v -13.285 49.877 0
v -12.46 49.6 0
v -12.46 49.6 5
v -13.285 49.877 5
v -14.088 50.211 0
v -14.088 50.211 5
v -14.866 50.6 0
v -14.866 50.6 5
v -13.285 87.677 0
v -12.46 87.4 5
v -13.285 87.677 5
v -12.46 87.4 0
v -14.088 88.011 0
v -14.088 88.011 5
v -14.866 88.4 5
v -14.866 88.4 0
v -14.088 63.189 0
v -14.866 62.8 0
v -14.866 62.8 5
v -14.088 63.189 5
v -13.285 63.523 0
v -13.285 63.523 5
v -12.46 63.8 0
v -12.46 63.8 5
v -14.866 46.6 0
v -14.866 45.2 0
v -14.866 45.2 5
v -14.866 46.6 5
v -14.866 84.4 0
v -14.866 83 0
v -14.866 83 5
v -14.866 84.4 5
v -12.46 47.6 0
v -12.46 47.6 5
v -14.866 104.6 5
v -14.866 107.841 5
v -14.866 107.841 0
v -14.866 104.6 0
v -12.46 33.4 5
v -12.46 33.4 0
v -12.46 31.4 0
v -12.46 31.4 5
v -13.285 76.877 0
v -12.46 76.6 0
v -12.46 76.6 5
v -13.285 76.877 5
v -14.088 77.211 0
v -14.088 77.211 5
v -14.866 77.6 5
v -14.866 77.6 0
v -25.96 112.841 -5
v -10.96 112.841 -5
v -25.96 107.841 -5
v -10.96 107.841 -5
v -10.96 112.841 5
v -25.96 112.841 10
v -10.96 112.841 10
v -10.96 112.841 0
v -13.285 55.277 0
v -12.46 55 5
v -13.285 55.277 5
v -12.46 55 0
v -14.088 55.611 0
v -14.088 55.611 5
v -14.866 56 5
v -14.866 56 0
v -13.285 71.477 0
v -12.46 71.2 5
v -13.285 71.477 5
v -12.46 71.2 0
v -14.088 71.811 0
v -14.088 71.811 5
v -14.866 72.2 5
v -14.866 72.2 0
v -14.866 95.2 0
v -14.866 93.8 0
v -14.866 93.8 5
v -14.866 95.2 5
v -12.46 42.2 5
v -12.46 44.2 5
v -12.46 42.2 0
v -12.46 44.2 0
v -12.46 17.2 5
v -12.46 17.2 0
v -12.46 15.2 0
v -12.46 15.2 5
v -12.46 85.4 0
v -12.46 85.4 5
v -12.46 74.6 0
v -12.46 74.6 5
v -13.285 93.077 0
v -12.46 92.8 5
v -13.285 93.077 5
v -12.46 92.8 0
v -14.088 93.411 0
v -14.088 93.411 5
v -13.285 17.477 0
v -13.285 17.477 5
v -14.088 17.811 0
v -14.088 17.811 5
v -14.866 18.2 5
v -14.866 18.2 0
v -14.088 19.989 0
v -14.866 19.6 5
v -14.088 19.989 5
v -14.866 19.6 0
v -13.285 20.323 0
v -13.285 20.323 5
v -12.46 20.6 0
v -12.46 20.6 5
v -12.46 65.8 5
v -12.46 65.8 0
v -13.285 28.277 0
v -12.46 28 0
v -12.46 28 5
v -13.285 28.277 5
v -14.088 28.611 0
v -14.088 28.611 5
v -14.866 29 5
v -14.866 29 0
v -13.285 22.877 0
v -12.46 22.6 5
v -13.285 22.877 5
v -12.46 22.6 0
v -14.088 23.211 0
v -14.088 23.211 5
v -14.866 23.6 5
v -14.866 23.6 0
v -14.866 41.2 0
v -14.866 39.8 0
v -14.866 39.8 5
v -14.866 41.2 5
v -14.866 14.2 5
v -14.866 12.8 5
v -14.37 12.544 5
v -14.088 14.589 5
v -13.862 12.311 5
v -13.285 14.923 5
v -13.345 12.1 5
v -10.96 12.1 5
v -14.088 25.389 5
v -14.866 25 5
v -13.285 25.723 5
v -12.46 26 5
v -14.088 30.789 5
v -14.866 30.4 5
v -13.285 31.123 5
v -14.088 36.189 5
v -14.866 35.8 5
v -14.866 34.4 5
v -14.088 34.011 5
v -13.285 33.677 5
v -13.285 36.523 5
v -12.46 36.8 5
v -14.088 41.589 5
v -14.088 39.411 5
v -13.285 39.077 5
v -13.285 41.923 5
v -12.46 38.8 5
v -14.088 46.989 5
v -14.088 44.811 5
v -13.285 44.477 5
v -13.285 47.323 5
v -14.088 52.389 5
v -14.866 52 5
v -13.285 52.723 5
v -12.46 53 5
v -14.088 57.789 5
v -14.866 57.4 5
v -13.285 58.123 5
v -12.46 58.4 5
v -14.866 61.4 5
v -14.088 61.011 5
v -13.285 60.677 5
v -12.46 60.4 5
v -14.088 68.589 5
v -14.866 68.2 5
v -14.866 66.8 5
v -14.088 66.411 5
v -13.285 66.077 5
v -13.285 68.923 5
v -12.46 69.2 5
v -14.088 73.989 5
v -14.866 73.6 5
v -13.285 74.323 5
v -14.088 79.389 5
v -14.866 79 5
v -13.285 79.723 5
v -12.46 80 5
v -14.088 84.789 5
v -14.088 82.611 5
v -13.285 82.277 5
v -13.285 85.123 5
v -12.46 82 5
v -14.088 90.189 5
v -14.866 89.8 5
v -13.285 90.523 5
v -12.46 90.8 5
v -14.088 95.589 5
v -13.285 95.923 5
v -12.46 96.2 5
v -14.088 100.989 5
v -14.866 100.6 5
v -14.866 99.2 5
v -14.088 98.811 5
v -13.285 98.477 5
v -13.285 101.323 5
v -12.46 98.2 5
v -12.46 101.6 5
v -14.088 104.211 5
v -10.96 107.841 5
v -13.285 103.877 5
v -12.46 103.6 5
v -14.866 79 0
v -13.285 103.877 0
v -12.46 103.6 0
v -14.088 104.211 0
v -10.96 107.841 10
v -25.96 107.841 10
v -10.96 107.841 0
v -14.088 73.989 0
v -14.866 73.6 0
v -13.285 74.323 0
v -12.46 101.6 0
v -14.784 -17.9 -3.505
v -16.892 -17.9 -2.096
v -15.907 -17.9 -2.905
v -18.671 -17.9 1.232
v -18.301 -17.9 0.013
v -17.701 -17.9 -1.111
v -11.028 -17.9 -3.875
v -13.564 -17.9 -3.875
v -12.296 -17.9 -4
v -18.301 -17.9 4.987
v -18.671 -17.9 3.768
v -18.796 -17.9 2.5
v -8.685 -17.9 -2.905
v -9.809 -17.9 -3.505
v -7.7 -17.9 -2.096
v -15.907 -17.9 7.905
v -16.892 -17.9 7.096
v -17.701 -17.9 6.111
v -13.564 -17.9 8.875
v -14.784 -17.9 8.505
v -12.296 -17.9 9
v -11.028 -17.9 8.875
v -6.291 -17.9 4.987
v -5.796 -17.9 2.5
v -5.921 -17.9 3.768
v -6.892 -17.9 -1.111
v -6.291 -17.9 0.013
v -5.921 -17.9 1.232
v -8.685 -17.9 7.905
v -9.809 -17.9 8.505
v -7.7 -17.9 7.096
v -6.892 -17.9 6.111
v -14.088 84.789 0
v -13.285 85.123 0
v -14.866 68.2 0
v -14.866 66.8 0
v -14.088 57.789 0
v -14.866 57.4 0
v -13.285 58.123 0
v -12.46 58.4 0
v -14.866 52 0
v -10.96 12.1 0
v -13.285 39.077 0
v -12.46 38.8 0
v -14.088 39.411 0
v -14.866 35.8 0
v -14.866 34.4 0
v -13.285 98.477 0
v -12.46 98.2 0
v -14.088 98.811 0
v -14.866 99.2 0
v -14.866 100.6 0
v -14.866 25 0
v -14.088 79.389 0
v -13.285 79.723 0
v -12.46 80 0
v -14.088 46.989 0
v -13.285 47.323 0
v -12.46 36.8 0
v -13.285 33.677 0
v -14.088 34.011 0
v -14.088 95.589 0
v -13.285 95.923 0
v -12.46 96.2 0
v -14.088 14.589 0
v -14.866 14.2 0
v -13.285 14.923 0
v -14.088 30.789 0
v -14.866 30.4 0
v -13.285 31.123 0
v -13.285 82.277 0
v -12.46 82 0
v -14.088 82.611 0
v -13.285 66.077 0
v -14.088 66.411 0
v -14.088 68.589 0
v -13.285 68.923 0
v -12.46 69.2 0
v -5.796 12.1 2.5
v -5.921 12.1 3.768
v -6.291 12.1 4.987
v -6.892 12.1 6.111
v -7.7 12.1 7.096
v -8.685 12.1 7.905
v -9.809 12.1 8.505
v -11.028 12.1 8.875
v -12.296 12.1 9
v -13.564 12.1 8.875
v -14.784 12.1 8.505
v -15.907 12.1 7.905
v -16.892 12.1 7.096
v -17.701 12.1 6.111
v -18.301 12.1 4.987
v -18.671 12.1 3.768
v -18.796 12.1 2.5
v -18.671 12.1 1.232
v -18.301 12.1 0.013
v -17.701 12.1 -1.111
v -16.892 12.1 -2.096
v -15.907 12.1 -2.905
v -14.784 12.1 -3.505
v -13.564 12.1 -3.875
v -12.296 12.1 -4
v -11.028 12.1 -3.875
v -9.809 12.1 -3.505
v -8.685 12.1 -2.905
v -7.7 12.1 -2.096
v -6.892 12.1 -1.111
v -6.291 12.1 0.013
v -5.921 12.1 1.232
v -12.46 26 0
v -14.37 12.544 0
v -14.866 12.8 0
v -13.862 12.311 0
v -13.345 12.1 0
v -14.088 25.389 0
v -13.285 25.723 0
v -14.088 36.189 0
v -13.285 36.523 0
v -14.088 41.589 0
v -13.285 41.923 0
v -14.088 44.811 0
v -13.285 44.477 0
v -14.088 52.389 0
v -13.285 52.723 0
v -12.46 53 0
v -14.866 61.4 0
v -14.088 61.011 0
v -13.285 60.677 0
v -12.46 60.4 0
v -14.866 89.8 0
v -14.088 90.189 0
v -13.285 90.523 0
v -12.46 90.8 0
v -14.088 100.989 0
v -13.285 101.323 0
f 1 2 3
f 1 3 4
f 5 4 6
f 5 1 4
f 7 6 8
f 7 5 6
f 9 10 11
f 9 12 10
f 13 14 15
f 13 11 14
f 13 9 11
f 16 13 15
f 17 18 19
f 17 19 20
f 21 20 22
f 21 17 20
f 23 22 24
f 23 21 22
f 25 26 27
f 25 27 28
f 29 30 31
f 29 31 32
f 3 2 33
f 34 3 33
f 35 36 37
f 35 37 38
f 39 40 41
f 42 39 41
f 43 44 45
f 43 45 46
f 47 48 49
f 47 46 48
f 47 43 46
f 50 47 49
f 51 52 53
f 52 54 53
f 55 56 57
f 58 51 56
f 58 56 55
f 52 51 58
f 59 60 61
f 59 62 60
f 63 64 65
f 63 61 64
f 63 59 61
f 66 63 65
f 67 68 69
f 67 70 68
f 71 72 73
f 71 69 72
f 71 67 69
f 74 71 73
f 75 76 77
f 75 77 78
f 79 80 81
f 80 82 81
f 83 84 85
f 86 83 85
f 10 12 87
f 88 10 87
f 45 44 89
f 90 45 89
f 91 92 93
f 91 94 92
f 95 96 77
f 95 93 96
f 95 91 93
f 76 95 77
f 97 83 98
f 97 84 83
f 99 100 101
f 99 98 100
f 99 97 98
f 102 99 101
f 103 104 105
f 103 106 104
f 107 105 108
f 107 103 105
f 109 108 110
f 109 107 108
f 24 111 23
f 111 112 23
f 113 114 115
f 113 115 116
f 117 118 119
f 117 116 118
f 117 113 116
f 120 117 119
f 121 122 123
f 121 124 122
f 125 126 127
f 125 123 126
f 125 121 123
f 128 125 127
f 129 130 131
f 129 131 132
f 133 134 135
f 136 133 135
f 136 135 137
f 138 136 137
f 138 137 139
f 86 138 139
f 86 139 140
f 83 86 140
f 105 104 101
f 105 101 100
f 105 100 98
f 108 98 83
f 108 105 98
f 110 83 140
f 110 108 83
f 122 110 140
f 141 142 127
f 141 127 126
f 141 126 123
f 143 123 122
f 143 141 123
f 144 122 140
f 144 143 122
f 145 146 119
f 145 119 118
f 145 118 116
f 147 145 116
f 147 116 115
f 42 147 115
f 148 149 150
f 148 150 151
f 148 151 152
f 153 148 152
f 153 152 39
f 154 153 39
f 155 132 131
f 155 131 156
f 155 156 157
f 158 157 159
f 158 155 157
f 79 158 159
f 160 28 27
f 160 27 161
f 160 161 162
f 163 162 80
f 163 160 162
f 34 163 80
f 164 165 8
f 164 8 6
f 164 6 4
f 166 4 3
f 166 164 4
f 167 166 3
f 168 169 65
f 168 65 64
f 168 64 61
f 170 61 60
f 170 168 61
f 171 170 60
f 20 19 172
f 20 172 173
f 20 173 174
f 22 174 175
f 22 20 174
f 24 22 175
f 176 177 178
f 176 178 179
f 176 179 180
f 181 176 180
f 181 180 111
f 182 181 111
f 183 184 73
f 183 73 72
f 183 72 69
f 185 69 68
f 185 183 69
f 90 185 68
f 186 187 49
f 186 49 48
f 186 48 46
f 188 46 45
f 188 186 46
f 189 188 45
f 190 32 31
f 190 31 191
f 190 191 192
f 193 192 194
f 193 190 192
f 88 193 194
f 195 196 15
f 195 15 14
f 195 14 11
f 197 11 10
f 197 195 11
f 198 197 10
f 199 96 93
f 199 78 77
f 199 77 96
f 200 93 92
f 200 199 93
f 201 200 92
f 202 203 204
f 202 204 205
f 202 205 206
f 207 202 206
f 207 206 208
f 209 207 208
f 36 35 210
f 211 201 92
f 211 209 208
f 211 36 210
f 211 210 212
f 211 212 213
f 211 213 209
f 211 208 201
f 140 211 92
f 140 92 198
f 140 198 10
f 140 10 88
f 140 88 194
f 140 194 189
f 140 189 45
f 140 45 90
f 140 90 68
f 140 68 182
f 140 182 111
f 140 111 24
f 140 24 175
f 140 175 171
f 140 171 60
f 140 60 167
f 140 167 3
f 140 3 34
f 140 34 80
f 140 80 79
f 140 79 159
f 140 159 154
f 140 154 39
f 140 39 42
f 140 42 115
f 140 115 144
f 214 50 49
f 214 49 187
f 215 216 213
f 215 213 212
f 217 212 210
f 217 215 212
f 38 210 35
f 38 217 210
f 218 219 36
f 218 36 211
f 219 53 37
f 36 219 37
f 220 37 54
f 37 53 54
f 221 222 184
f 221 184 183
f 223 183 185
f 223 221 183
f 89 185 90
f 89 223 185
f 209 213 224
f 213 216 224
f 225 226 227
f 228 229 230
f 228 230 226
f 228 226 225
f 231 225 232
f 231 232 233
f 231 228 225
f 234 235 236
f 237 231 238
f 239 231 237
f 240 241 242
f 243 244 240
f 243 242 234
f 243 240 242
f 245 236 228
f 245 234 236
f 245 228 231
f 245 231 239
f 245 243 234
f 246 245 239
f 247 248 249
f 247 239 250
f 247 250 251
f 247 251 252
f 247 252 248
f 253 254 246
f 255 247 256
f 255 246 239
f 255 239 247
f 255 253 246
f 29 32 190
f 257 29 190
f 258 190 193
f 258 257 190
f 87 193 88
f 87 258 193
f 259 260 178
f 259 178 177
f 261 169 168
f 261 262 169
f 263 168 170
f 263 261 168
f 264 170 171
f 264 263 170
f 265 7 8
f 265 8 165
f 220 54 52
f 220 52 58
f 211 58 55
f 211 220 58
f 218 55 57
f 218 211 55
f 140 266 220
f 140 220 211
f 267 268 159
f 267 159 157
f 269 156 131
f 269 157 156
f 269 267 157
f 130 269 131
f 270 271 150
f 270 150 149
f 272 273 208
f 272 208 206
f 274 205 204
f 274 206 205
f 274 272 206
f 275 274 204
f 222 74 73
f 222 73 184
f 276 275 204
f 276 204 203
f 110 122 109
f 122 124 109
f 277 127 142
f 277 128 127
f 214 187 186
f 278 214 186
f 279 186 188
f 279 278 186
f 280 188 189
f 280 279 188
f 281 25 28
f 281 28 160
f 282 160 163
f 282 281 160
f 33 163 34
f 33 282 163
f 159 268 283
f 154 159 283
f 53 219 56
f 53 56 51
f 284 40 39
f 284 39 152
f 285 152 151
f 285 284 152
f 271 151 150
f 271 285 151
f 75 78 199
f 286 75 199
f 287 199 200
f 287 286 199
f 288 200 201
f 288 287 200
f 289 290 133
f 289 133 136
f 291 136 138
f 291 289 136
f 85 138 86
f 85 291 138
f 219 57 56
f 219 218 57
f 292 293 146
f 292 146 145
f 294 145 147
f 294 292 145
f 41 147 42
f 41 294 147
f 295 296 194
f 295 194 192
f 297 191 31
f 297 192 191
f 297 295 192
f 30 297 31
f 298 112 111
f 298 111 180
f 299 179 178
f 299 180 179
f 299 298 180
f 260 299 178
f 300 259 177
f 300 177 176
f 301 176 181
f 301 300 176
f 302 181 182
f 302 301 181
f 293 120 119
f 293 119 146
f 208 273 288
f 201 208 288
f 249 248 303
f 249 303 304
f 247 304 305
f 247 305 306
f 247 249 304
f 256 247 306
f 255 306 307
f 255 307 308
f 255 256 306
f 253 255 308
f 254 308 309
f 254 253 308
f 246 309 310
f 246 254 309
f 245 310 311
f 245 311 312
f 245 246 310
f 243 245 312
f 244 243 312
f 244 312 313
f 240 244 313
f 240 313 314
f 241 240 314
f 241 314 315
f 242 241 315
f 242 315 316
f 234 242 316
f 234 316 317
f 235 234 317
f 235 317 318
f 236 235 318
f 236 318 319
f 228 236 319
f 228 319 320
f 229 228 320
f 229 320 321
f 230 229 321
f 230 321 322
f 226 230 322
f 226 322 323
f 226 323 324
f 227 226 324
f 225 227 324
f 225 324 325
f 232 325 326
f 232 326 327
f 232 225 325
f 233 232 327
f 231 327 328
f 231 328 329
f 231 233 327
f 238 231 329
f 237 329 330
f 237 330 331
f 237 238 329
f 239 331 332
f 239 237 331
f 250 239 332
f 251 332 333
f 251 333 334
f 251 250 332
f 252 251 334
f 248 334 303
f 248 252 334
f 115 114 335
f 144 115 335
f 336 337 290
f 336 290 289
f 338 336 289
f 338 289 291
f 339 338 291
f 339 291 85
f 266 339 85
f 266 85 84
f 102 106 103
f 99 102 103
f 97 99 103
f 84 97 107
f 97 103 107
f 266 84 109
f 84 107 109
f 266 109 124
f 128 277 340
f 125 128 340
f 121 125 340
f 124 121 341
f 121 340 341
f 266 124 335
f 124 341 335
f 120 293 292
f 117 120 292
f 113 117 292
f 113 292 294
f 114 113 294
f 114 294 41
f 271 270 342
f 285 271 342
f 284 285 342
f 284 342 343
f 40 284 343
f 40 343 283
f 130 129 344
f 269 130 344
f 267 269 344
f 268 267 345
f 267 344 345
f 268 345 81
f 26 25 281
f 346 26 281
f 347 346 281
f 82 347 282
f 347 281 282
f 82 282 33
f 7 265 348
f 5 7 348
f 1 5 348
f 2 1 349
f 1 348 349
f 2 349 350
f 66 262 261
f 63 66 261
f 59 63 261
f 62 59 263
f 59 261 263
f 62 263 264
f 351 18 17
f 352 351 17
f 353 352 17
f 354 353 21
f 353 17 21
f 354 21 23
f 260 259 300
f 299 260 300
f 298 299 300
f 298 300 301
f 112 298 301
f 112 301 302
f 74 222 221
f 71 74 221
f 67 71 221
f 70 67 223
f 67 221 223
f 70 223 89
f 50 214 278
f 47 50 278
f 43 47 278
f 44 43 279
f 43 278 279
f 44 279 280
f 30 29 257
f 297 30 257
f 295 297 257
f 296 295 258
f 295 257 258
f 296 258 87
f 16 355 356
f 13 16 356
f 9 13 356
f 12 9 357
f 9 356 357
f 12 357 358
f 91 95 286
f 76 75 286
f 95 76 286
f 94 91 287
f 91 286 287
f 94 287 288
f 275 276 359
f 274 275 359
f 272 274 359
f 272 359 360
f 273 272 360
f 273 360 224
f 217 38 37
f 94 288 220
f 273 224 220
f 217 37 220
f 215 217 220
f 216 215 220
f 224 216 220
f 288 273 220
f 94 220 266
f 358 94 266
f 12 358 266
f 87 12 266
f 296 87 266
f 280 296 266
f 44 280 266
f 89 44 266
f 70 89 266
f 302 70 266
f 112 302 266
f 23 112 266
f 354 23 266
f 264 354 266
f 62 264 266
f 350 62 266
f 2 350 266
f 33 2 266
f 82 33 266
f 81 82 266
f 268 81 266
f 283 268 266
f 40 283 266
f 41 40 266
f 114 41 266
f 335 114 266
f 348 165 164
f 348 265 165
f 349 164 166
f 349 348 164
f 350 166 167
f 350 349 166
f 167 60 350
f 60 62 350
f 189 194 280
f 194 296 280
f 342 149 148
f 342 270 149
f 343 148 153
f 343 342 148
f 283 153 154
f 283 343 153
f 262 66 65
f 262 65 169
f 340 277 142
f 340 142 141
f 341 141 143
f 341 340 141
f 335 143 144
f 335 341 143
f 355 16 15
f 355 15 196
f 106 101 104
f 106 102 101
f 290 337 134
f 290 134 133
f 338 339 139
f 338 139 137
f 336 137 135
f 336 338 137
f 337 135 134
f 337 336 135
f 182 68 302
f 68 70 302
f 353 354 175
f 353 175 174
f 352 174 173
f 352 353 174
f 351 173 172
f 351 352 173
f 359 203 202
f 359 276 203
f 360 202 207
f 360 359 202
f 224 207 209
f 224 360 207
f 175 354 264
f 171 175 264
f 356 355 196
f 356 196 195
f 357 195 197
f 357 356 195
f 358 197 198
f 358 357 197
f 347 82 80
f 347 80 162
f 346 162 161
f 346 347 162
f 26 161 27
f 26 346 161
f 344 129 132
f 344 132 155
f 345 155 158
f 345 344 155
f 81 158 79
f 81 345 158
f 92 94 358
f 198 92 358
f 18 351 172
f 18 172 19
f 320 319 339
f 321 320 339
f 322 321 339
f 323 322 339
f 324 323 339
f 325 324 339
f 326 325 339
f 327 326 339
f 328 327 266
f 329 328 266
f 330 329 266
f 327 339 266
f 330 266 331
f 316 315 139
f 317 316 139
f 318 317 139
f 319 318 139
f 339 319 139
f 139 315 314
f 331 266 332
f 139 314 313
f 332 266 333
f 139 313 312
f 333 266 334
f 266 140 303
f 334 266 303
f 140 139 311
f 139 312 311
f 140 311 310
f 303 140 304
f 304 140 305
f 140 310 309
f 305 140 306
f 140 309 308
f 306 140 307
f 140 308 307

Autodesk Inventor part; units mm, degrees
ref_plane "YZ Plane" through (0, 0, 0) normal (1, 0, 0) x (0, 1, 0)
ref_plane "XZ Plane" through (0, 0, 0) normal (0, 1, 0) x (-1, 0, 0)
ref_plane "XY Plane" through (0, 0, 0) normal (0, 0, 1) x (1, 0, 0)
sketch "Skizze2" plane through (0, 0, 0) normal (0, 0, 1) x (1, 0, 0)
  circle A0 centre (0, 0) radius 12.5 construction
  circle A1 centre (0, 0) radius 15
  line L0 (-15, 0) -> (-12.5, 0)
  arc A2 (-12.4599, -1) -> (-14.8661, -2) centre (-8.8919, -12.9799) ccw
  arc A3 (-14.8661, 2) -> (-12.4599, 1) centre (-8.8919, 12.9799) ccw
  arc A4 (-14.8661, 2) -> (-14.8661, -2) centre (0, 0) ccw
  arc A5 (-12.4599, 1) -> (-12.4599, -1) centre (0, 0) ccw
  circle A6 centre (0, 0) radius 15
  line L1 (-12.4599, 1) -> (-12.4599, -1)
  line L2 (-12.4599, 1) -> (-12.4599, 21)
  line L3 (-12.4599, -1) -> (-12.4599, -21)
  line L4 (-14.8661, -2) -> (-14.8661, -21)
  line L5 (-12.4599, -21) -> (-14.8661, -21)
  line L6 (-14.8661, 2) -> (-14.8661, 21)
  line L7 (-14.8661, 21) -> (-12.4599, 21)
  line L8 (-12.4599, 21) -> (-10.9599, 21)
  line L9 (-10.9599, 21) -> (-10.9599, -21)
  line L10 (-10.9599, -21) -> (-12.4599, -21)
  line L11 (-14.8661, 2) -> (-14.8661, 2.9)
  line L12 (-14.8661, 2.9) -> (-12.4599, 2.9)
  line L13 (-14.8661, -2) -> (-14.8661, -2.9)
  line L14 (-14.8661, -2.9) -> (-12.4599, -2.9)
  point P0 (-13.75, 0)
  point P1 (-15, 0)
  point P2 (-12.4599, -8.3516)
  point P3 (-10.9599, -10.2411)
  point P4 (-10.9599, 10.2411)
  point P5 (-12.4599, 8.3516)
  dimension "d5" = 25
  dimension "d6" = 12.5
  dimension "d7" = 4
  dimension "d8" = 2
  dimension "d9" = 13.75
  dimension "d11" = 30
  dimension "d12" = 20
  dimension "d13" = 20
  dimension "d14" = 1.5
  dimension "d17" = 0.9
  dimension "d18" = 0.9
extrude "Extrusion1" add sketch "Skizze2" along normal blind 5 contours L6 L12 A1 | A1 L12 L2 A3 | L2 A1 L9 L3 L1 | A2 L3 L14 A1 | A1 L14 L4
pattern_linear "Rechteckige Anordnung1" count 20 spacing 5.4 along (0, 1, 0) of "Extrusion1"
sketch "Skizze3" plane through (-12.4599, 105.5, 0) normal (-1, 0, 0) x (0, 0, 1)
  line L0 (5, -115.7411) -> (5, 7.3411) projected
  line L1 (5, 2.3411) -> (0, 2.3411)
  line L2 (0, -115.7411) -> (0, 7.3411) projected
  line L3 (0, 2.3411) -> (0, 7.3411)
  line L4 (0, 7.3411) -> (5, 7.3411)
  line L5 (5, 7.3411) -> (5, 2.3411)
  point P0 (0, -105.5)
  point P1 (2.5, 7.3411)
  dimension "d22" = 5
extrude "Extrusion2" cut sketch "Skizze3" against normal blind 5
sketch "Skizze4" plane through (-12.4599, 107.8411, 5) normal (0, 1, 0) x (1, 0, 0)
  line L0 (1.5, 5) -> (1.5, 0) projected
  line L1 (1.5, 0) -> (1.5, 5)
  line L2 (1.5, 5) -> (1.5, 10)
  line L3 (1.5, 10) -> (-13.5, 10)
  line L4 (1.5, 2.5) -> (-2.4061, 2.5) construction
  line L5 (-2.4061, 5) -> (-2.4061, 0) projected
  line L6 (-13.5, 10) -> (-13.5, 5)
  line L7 (1.5, 0) -> (1.5, 5)
  line L8 (1.5, 0) -> (1.5, -5)
  line L9 (1.5, -5) -> (-13.5, -5)
  line L10 (-13.5, -5) -> (-13.5, 5)
  point P0 (12.4599, 5)
  dimension "d25" = 5
  dimension "d26" = 15
extrude "Extrusion3" add sketch "Skizze4" along normal blind 5
sketch "Skizze5" plane through (0, 0, 5) normal (0, 0, 1) x (1, 0, 0)
  line L0 (-14.8661, 105.5) -> (-14.8661, 104.6) projected
  line L1 (-12.4599, 107.8411) -> (-10.9599, 107.8411) projected
  line L2 (-14.8661, 105.5) -> (-12.4599, 105.5)
  line L3 (-12.4599, 105.5) -> (-12.4599, 107.8411)
  line L4 (-12.4599, 107.8411) -> (-14.8661, 107.8411)
  line L5 (-14.8661, 107.8411) -> (-14.8661, 105.5)
  point P0 (0, 0)
extrude "Extrusion4" add sketch "Skizze5" against normal blind 5
sketch "Skizze7" plane through (-12.4599, -8.3516, 0) normal (-1, 0, 0) x (0, 0, 1)
  line L0 (5, -1.8894) -> (5, 116.1927) projected
  line L1 (0, -1.8894) -> (5, -1.8894) projected
  line L2 (5, 2.1106) -> (0, 2.1106)
  line L3 (0, 2.1106) -> (0, -1.8894)
  line L4 (0, -1.8894) -> (5, -1.8894)
  line L5 (5, -1.8894) -> (5, 2.1106)
  point P0 (0, 8.3516)
  dimension "d34" = 4
extrude "Extrusion6" cut sketch "Skizze7" against normal blind 10
sketch "Skizze8" plane through (-14.8661, -2.9, 0) normal (0, -1, 0) x (1, 0, 0)
  circle A0 centre (2.57, 2.5) radius 6.5
  line L0 (0, 0) -> (0, 5) projected
  line L1 (0, 5) -> (2.4061, 5) projected
  point P0 (14.8661, 0)
  dimension "d37" = 13
  dimension "d38" = 2.57
  dimension "d39" = 2.5
extrude "Extrusion7" add sketch "Skizze8" along normal mid plane 30
properties part number "Lineartranslator"
